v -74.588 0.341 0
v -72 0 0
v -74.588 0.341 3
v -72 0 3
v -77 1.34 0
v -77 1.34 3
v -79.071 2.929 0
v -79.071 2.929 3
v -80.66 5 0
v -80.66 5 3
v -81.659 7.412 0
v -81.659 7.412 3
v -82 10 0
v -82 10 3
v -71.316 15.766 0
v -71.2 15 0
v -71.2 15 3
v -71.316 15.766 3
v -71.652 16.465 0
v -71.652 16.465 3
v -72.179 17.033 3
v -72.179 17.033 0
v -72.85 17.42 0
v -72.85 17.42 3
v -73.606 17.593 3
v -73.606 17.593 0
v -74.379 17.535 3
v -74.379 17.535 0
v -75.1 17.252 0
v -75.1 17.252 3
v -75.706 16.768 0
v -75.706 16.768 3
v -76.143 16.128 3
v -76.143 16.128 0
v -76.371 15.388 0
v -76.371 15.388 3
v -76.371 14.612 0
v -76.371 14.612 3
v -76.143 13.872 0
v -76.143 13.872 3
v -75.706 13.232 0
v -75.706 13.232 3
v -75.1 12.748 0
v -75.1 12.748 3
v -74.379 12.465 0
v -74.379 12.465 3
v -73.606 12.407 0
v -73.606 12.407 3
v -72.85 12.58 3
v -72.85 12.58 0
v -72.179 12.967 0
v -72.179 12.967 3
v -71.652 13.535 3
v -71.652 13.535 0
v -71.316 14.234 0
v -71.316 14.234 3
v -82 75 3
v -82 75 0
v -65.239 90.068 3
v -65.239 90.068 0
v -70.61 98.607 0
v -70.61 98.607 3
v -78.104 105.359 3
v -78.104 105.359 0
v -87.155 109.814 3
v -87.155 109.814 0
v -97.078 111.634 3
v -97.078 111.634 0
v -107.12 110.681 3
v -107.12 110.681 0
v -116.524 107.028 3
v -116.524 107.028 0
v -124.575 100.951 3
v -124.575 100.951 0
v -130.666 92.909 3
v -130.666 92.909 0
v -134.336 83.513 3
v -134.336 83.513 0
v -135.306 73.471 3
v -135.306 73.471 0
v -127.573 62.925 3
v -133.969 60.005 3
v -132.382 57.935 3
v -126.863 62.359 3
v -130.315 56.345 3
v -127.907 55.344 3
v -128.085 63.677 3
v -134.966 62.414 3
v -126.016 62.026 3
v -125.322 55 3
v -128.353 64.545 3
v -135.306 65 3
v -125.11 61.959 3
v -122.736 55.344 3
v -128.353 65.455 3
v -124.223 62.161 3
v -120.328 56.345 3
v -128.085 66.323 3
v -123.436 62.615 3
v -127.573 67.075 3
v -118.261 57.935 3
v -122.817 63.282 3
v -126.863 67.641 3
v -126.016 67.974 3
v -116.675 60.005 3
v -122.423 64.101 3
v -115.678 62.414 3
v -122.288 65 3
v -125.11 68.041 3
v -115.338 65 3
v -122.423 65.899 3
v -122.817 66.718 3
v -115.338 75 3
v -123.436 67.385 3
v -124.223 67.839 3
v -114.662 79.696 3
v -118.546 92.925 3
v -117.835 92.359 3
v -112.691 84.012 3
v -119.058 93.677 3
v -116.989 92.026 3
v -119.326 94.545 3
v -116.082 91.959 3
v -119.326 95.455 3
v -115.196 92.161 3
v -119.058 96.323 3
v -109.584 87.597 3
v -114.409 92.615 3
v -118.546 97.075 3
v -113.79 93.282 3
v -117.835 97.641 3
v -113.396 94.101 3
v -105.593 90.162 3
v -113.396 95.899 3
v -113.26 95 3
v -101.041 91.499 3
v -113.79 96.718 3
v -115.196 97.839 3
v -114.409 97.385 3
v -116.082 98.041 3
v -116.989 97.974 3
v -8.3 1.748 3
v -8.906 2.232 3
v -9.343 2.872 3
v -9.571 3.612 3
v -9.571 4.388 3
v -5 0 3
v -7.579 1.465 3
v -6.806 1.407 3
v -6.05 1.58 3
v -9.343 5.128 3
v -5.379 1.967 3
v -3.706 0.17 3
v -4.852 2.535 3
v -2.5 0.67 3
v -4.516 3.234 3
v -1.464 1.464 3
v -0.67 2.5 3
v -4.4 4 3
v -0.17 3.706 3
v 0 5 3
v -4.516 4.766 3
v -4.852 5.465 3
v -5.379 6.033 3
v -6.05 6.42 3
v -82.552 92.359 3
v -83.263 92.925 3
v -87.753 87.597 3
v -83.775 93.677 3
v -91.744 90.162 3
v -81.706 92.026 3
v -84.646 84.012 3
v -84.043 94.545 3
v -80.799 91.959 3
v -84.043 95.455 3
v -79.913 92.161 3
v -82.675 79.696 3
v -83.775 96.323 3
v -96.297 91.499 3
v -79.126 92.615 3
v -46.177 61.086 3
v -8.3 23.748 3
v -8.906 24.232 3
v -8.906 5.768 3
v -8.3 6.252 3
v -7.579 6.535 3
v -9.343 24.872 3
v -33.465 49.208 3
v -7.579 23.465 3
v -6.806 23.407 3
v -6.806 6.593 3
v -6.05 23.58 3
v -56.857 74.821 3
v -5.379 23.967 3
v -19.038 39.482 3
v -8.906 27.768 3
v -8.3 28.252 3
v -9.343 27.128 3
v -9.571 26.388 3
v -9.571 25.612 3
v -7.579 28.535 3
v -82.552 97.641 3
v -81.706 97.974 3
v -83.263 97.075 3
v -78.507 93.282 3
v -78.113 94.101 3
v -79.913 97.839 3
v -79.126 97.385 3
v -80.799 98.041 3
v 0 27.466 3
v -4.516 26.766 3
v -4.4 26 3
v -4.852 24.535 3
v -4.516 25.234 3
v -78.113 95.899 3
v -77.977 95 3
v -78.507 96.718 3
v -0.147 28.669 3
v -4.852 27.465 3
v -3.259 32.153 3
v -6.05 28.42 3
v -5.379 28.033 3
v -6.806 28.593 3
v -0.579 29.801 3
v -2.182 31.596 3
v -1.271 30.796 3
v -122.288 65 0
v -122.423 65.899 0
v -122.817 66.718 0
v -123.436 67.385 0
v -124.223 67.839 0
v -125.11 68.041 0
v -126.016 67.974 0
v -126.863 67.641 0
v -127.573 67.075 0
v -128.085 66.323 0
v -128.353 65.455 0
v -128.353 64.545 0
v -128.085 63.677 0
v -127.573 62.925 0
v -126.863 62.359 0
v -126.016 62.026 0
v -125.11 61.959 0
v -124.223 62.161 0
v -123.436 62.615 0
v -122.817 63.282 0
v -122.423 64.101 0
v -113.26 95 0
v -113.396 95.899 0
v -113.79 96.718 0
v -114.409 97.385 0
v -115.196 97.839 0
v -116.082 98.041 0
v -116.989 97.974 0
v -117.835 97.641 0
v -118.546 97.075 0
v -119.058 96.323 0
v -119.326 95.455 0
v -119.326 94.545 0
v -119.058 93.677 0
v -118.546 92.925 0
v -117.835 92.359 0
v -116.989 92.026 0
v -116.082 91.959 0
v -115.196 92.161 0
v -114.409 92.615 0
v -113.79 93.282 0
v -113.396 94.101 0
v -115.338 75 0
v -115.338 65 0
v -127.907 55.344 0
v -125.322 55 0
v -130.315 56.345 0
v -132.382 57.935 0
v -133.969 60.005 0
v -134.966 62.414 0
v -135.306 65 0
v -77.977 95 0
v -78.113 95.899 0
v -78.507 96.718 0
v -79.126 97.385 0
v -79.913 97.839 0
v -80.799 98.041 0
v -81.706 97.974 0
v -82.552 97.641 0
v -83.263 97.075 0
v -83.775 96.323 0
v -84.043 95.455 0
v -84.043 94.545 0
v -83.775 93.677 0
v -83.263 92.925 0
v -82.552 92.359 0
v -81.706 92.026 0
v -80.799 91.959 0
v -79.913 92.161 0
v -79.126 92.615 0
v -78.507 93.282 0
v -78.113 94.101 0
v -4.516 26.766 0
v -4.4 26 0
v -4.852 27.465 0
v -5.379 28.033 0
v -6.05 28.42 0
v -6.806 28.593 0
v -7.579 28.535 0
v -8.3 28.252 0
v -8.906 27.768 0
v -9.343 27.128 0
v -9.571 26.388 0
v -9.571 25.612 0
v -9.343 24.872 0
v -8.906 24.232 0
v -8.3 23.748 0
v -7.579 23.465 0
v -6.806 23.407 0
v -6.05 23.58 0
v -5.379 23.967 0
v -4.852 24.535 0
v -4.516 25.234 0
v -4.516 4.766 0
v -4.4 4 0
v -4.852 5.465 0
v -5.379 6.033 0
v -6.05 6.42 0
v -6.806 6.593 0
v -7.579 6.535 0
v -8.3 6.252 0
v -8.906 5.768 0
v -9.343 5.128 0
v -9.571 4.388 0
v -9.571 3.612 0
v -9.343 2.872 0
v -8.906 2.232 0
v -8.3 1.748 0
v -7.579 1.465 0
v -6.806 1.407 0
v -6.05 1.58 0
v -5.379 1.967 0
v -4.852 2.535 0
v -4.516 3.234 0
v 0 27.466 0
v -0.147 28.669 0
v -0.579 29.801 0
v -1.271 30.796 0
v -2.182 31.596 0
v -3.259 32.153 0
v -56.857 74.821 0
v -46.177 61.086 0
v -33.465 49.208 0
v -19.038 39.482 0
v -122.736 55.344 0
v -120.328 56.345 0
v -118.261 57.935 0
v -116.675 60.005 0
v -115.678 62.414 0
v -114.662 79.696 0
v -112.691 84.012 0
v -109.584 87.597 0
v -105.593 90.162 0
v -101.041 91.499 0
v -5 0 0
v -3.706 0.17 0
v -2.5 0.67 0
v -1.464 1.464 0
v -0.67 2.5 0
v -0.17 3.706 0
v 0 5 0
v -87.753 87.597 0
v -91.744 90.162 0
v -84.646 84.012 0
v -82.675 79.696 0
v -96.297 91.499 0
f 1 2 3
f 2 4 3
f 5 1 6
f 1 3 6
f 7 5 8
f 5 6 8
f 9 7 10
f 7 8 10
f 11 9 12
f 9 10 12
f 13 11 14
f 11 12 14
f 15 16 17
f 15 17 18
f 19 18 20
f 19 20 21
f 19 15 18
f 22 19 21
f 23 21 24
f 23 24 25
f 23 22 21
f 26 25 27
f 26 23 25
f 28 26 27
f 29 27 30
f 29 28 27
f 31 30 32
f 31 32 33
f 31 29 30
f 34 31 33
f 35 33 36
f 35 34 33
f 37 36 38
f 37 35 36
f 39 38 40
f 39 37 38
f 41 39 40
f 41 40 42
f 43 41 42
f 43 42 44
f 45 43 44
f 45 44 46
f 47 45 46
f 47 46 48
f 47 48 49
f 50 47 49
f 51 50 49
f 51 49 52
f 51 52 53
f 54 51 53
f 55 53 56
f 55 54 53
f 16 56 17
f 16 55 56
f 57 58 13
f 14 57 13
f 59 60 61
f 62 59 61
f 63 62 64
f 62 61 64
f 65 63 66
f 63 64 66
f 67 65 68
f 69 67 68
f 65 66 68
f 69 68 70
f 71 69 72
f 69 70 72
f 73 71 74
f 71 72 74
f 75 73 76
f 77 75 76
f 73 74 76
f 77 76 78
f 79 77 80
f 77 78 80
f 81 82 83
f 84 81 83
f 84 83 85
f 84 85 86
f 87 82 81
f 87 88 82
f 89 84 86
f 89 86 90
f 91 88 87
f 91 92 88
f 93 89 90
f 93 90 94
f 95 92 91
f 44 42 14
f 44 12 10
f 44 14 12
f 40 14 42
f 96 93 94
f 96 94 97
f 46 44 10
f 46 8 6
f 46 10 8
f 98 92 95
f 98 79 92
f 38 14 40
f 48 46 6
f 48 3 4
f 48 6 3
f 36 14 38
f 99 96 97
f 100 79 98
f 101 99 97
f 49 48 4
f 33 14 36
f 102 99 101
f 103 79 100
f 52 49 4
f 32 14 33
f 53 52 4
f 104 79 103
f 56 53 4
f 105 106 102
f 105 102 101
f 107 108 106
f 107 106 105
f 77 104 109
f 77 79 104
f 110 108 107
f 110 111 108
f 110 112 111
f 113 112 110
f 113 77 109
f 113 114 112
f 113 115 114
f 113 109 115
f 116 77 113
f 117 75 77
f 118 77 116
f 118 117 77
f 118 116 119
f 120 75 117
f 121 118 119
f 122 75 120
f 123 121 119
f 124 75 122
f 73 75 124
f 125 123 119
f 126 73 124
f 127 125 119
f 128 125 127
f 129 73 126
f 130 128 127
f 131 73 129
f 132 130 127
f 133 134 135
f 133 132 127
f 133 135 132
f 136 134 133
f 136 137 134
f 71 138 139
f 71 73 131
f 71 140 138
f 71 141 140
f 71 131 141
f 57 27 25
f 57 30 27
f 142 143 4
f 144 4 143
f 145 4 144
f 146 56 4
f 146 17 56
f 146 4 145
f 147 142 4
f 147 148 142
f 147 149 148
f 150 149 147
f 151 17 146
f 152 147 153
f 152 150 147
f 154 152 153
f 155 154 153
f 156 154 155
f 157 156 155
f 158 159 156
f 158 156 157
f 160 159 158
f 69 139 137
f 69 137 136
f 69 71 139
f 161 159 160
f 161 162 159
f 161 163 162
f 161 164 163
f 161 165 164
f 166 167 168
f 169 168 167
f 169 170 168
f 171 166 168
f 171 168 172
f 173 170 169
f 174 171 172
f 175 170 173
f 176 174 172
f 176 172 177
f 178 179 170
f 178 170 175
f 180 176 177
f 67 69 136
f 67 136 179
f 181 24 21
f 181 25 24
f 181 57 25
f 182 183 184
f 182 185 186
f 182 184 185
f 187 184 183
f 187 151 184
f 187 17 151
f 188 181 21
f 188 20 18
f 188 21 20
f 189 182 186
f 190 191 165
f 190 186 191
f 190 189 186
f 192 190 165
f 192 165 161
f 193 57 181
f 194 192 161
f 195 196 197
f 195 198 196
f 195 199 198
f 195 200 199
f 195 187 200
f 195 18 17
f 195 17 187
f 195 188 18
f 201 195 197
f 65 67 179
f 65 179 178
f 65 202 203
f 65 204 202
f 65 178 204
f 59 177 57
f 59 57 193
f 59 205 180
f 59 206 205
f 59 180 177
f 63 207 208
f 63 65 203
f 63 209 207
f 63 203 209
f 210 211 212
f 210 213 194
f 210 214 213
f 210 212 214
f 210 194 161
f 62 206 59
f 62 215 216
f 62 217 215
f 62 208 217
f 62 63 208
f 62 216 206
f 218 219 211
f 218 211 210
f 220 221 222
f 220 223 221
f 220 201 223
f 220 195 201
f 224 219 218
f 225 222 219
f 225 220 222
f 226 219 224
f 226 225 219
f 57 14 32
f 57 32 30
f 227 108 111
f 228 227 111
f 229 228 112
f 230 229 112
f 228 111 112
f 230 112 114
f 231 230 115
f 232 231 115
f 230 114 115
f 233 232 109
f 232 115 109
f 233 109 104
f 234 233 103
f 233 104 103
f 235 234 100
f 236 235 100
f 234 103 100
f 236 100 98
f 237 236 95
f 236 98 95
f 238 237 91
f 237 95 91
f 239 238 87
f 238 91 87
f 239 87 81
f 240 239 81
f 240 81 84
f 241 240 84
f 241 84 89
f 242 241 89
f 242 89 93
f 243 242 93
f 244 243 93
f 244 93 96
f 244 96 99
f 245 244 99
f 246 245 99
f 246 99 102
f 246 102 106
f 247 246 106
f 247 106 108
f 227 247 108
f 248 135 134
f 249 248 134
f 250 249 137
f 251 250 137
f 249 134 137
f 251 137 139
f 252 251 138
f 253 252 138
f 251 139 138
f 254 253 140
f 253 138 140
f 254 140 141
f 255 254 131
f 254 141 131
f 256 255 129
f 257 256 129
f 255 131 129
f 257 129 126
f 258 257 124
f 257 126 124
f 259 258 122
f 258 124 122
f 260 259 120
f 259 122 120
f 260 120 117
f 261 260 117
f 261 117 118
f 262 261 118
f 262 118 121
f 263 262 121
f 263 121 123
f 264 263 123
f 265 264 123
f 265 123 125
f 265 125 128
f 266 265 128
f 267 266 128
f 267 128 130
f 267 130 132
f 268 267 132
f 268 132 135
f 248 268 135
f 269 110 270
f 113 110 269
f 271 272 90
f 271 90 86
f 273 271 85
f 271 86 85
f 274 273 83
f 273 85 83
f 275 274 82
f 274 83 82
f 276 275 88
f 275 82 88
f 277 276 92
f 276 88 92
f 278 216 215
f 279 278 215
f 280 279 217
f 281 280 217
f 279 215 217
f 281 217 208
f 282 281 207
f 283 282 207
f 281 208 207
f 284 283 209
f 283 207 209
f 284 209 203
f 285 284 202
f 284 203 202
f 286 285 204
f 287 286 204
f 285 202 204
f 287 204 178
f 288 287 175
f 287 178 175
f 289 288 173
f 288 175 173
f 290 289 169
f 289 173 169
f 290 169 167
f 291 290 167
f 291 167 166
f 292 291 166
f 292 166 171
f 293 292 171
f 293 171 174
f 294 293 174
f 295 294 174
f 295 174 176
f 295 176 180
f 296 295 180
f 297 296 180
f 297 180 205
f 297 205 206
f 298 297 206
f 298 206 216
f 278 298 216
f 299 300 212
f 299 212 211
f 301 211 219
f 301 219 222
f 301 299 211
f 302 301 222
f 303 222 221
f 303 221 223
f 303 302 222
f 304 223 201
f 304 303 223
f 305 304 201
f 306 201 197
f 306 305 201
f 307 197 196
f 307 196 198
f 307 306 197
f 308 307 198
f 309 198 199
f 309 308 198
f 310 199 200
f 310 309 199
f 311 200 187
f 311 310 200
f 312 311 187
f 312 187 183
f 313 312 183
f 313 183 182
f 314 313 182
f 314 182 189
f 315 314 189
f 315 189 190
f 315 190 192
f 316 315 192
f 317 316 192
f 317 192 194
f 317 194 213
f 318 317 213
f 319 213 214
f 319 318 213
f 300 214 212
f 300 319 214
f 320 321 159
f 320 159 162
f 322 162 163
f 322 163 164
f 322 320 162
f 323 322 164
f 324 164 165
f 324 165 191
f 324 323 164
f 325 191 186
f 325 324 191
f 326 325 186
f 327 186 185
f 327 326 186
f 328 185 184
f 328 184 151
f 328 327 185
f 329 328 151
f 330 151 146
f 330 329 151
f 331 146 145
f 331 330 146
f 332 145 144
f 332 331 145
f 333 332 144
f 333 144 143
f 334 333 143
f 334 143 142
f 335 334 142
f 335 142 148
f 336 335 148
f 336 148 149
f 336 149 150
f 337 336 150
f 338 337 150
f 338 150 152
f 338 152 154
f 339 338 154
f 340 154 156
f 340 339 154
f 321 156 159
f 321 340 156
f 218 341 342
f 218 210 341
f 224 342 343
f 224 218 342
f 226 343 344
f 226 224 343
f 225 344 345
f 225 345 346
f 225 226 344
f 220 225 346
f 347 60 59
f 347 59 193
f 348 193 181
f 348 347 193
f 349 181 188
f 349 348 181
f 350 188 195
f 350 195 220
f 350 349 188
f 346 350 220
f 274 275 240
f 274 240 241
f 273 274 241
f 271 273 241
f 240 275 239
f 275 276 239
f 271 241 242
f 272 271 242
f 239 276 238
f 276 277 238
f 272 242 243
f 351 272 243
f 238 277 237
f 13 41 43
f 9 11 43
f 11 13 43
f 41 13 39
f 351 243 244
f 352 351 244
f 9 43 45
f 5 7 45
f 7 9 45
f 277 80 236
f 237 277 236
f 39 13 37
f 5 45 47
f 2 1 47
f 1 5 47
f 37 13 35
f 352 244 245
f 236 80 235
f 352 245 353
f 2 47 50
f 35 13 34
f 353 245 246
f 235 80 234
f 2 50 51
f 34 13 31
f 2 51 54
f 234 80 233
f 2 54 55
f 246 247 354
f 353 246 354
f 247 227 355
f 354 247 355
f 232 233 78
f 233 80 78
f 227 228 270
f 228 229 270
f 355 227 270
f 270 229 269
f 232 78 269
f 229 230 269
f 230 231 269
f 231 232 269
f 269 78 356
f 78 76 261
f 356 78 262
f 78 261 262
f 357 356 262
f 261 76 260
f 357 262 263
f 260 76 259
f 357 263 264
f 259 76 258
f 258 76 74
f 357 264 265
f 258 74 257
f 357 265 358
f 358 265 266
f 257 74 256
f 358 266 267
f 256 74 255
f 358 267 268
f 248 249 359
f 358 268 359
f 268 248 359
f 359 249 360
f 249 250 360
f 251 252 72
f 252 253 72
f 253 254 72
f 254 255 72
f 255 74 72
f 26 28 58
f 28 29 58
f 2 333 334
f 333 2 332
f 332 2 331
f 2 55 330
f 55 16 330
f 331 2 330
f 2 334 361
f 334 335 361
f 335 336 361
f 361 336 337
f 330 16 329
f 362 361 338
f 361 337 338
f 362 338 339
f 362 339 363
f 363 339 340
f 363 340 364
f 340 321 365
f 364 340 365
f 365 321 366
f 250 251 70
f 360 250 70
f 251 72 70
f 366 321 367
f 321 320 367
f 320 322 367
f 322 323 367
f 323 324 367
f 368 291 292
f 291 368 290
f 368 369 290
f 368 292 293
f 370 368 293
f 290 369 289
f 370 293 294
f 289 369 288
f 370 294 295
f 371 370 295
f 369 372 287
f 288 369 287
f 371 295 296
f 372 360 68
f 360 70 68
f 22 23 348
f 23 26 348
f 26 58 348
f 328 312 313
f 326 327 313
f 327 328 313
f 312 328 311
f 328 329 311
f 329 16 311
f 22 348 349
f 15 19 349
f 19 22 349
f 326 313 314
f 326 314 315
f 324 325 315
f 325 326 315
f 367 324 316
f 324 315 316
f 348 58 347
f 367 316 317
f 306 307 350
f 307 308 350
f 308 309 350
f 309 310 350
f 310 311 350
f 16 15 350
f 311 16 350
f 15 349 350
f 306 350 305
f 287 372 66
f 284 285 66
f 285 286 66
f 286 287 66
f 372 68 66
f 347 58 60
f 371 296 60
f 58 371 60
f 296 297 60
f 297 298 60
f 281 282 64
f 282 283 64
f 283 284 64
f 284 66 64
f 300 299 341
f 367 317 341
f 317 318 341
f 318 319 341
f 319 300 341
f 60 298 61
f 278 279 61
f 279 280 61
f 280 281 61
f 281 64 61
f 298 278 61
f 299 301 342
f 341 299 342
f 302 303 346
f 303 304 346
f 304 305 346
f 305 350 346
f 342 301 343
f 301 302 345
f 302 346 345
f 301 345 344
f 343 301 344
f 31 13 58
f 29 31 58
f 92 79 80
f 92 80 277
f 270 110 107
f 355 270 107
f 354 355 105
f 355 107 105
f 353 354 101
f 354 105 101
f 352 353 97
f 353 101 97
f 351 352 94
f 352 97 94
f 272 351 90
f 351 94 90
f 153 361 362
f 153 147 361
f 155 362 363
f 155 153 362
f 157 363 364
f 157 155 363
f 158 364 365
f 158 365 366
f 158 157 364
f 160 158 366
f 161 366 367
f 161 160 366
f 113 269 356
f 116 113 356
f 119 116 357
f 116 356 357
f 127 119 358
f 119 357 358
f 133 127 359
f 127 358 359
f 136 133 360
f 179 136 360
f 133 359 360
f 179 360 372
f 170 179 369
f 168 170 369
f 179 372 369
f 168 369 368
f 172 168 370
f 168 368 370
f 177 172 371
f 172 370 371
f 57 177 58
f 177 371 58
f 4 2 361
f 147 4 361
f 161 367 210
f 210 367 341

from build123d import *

# Parameters (mm, degrees)
ESBO_O1_R                = 2.6
RESSALTO_EXTRUS_O1_DEPTH = 3
FILETE2_R                = 110
FILETE3_R                = 4
RESSALTO_EXTRUS_O2_DEPTH = 3
FILETE4_R                = 10
FILETE5_R                = 10
FILETE6_R                = 5
ESBO_O3_R                = 3.05
CORTE_EXTRUS_O1_DEPTH    = 10


with BuildPart() as part:
    # Esboço1 → Ressalto-extrusão1 (new body)
    with BuildSketch(Plane.XY):
        with BuildLine():
            Line((-82, 75), (-82, 0))
            Line((-82, 0), (0, 0))
            Line((0, 0), (0, 31))
            Line((0, 31), (-62, 31))
            Line((-62, 31), (-62, 75))
            ThreePointArc((-62, 75), (-99.43321729, 111.660780356), (-135.305624889, 73.47139772))
            Line((-135.305624889, 73.47139772), (-135.305624889, 63.47139772))
            Line((-135.305624889, 63.47139772), (-115.3375, 75))
            ThreePointArc((-115.3375, 75), (-98.66875, 91.66875), (-82, 75))
        make_face()
        with Locations((-7, 26)):
            Circle(ESBO_O1_R, mode=Mode.SUBTRACT)
        with Locations((-73.8, 15)):
            Circle(ESBO_O1_R, mode=Mode.SUBTRACT)
        with Locations((-7, 4)):
            Circle(ESBO_O1_R, mode=Mode.SUBTRACT)
    extrude(amount=RESSALTO_EXTRUS_O1_DEPTH)

    # Filete2
    # the kernel refuses this fillet: 110 mm, written as the material it adds along each edge
    with BuildSketch(Plane(origin=(-62, 31, 0), x_dir=(1, 0, 0), z_dir=(0, 0, 1))) as filete2_piece_1_section:
        with BuildLine():
            CenterArc((97.045462199, 104.267998826), FILETE2_R, 204.262159278, 47.159856314)
            Line((-3.238772458, 59.067641757), (-13.267195924, 54.54760605))
            ThreePointArc((-13.267195924, 54.54760605), (-11, 44), (-11, 0))
            Line((-11, 0), (0, -11))
            ThreePointArc((0, -11), (31, -11), (58.49545378, -10.426799883))
            Line((58.49545378, -10.426799883), (62, 0))
        make_face()
    filete2_piece_1 = extrude(amount=3, mode=Mode.PRIVATE)
    filete2_piece_1 = filete2_piece_1 - Plane(origin=(-7, 26, 1.5), x_dir=(1, 0, 0), z_dir=(0, 0, -1)) * Cylinder(2.6, 255, mode=Mode.PRIVATE)
    add(filete2_piece_1)

    # Filete3
    filete3_edges = [part.edges().sort_by_distance(p)[0] for p in [
        (-135.305624889, 63.47139772, 1.5),
    ]]
    fillet(filete3_edges, radius=FILETE3_R)

    # Esboço2 → Ressalto-extrusão2 (add, through all)
    with BuildSketch(Plane.XY.offset(3)):
        with BuildLine():
            ThreePointArc((-129.305624889, 66.935499335), (-133.305624889, 66.935499335), (-135.305624889, 70.39960095))
            Line((-135.305624889, 70.39960095), (-135.305624889, 55))
            Line((-135.305624889, 55), (-115.3375, 55))
            Line((-115.3375, 55), (-115.3375, 75))
            Line((-115.3375, 75), (-129.305624889, 66.935499335))
        make_face()
    extrude(amount=-RESSALTO_EXTRUS_O2_DEPTH)

    # Filete4
    # the kernel refuses this fillet: 10 mm, written as the material it takes off along each edge
    with BuildSketch(Plane(origin=(-135.305624889, 55, 28), x_dir=(0, 1, 0), z_dir=(0, 0, -1)), Plane(origin=(-115.3375, 55, 28), x_dir=(-1, 0, 0), z_dir=(0, 0, -1))) as filete4_piece_1:
        with BuildLine():
            CenterArc((FILETE4_R, FILETE4_R), FILETE4_R, 180, 90)
            Line((0, FILETE4_R), (0, 0))
            Line((0, 0), (FILETE4_R, 0))
        make_face()
    extrude(amount=53, mode=Mode.SUBTRACT)

    # Filete5
    filete5_edges = [part.edges().sort_by_distance(p)[0] for p in [
        (-82, 0, 1.5),
    ]]
    fillet(filete5_edges, radius=FILETE5_R)

    # Filete6
    filete6_edges = [part.edges().sort_by_distance(p)[0] for p in [
        (0, 31, 1.5),
        (0, 0, 1.5),
    ]]
    fillet(filete6_edges, radius=FILETE6_R)

    # Esboço3 → Corte-extrusão1 (cut)
    with BuildSketch(Plane.XY.offset(3)):
        with Locations((-125.3375, 65)):
            Circle(ESBO_O3_R)
        with Locations((-116.31024162, 95)):
            Circle(ESBO_O3_R)
        with Locations((-81.02725838, 95)):
            Circle(ESBO_O3_R)
    extrude(amount=-CORTE_EXTRUS_O1_DEPTH, mode=Mode.SUBTRACT)


solid = part.part
